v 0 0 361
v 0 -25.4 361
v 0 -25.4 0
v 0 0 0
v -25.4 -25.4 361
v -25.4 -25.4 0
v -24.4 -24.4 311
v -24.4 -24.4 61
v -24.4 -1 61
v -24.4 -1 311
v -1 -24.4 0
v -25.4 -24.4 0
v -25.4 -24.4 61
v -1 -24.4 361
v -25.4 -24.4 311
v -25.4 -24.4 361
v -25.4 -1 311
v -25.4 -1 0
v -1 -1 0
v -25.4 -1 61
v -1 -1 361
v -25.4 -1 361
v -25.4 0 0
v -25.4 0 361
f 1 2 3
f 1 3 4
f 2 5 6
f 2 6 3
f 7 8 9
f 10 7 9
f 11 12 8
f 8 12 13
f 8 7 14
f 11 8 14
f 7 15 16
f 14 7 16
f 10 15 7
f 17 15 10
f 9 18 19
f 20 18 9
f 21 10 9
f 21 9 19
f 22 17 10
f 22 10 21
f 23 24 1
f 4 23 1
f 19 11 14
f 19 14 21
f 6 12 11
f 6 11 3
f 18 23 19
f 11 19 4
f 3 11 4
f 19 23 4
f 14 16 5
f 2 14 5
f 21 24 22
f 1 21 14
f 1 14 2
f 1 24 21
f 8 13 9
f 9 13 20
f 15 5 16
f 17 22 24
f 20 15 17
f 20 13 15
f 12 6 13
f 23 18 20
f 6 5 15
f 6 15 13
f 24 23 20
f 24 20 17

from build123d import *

# Parameters (mm, degrees)
CROQUIS1_W              = 25.4
CROQUIS1_H              = 25.4
CROQUIS1_W_2            = 23.4
CROQUIS1_H_2            = 23.4
SALIENTE_EXTRUIR1_DEPTH = 361
CROQUIS2_W              = 50
CROQUIS2_H              = 23.4
CORTAR_EXTRUIR1_DEPTH   = 1
CORTAR_EXTRUIR2_REACH   = 364.783
CROQUIS3_W              = 11
CROQUIS3_H              = 23.4


with BuildPart() as part:
    # Croquis1 → Saliente-Extruir1 (new body)
    with BuildSketch(Plane.XY):
        with Locations((-12.7, -12.7)):
            Rectangle(CROQUIS1_W, CROQUIS1_H)
        with Locations((-12.7, -12.7)):
            Rectangle(CROQUIS1_W_2, CROQUIS1_H_2, mode=Mode.SUBTRACT)
    extrude(amount=SALIENTE_EXTRUIR1_DEPTH)

    # Croquis2 → Cortar-Extruir1 (cut)
    with BuildSketch(Plane.ZY.offset(25.4)):
        with Locations((336, -12.7)):
            Rectangle(CROQUIS2_W, CROQUIS2_H)
        with Locations((25, -12.7)):
            Rectangle(CROQUIS2_W, CROQUIS2_H)
    extrude(amount=-CORTAR_EXTRUIR1_DEPTH, mode=Mode.SUBTRACT)

    # Croquis3 → Cortar-Extruir2 (cut, up to next)
    with BuildSketch(Plane.ZY.offset(25.4), mode=Mode.PRIVATE) as cortar_extruir2_sk1:
        with Locations((55.5, -12.7)):
            Rectangle(CROQUIS3_W, CROQUIS3_H)
    cortar_extruir2_tool1 = extrude(cortar_extruir2_sk1.sketch, amount=-CORTAR_EXTRUIR2_REACH, mode=Mode.PRIVATE) & part.part
    add(cortar_extruir2_tool1.solids().sort_by_distance((-25.4, -12.7, 55.5))[0], mode=Mode.SUBTRACT)


solid = part.part
